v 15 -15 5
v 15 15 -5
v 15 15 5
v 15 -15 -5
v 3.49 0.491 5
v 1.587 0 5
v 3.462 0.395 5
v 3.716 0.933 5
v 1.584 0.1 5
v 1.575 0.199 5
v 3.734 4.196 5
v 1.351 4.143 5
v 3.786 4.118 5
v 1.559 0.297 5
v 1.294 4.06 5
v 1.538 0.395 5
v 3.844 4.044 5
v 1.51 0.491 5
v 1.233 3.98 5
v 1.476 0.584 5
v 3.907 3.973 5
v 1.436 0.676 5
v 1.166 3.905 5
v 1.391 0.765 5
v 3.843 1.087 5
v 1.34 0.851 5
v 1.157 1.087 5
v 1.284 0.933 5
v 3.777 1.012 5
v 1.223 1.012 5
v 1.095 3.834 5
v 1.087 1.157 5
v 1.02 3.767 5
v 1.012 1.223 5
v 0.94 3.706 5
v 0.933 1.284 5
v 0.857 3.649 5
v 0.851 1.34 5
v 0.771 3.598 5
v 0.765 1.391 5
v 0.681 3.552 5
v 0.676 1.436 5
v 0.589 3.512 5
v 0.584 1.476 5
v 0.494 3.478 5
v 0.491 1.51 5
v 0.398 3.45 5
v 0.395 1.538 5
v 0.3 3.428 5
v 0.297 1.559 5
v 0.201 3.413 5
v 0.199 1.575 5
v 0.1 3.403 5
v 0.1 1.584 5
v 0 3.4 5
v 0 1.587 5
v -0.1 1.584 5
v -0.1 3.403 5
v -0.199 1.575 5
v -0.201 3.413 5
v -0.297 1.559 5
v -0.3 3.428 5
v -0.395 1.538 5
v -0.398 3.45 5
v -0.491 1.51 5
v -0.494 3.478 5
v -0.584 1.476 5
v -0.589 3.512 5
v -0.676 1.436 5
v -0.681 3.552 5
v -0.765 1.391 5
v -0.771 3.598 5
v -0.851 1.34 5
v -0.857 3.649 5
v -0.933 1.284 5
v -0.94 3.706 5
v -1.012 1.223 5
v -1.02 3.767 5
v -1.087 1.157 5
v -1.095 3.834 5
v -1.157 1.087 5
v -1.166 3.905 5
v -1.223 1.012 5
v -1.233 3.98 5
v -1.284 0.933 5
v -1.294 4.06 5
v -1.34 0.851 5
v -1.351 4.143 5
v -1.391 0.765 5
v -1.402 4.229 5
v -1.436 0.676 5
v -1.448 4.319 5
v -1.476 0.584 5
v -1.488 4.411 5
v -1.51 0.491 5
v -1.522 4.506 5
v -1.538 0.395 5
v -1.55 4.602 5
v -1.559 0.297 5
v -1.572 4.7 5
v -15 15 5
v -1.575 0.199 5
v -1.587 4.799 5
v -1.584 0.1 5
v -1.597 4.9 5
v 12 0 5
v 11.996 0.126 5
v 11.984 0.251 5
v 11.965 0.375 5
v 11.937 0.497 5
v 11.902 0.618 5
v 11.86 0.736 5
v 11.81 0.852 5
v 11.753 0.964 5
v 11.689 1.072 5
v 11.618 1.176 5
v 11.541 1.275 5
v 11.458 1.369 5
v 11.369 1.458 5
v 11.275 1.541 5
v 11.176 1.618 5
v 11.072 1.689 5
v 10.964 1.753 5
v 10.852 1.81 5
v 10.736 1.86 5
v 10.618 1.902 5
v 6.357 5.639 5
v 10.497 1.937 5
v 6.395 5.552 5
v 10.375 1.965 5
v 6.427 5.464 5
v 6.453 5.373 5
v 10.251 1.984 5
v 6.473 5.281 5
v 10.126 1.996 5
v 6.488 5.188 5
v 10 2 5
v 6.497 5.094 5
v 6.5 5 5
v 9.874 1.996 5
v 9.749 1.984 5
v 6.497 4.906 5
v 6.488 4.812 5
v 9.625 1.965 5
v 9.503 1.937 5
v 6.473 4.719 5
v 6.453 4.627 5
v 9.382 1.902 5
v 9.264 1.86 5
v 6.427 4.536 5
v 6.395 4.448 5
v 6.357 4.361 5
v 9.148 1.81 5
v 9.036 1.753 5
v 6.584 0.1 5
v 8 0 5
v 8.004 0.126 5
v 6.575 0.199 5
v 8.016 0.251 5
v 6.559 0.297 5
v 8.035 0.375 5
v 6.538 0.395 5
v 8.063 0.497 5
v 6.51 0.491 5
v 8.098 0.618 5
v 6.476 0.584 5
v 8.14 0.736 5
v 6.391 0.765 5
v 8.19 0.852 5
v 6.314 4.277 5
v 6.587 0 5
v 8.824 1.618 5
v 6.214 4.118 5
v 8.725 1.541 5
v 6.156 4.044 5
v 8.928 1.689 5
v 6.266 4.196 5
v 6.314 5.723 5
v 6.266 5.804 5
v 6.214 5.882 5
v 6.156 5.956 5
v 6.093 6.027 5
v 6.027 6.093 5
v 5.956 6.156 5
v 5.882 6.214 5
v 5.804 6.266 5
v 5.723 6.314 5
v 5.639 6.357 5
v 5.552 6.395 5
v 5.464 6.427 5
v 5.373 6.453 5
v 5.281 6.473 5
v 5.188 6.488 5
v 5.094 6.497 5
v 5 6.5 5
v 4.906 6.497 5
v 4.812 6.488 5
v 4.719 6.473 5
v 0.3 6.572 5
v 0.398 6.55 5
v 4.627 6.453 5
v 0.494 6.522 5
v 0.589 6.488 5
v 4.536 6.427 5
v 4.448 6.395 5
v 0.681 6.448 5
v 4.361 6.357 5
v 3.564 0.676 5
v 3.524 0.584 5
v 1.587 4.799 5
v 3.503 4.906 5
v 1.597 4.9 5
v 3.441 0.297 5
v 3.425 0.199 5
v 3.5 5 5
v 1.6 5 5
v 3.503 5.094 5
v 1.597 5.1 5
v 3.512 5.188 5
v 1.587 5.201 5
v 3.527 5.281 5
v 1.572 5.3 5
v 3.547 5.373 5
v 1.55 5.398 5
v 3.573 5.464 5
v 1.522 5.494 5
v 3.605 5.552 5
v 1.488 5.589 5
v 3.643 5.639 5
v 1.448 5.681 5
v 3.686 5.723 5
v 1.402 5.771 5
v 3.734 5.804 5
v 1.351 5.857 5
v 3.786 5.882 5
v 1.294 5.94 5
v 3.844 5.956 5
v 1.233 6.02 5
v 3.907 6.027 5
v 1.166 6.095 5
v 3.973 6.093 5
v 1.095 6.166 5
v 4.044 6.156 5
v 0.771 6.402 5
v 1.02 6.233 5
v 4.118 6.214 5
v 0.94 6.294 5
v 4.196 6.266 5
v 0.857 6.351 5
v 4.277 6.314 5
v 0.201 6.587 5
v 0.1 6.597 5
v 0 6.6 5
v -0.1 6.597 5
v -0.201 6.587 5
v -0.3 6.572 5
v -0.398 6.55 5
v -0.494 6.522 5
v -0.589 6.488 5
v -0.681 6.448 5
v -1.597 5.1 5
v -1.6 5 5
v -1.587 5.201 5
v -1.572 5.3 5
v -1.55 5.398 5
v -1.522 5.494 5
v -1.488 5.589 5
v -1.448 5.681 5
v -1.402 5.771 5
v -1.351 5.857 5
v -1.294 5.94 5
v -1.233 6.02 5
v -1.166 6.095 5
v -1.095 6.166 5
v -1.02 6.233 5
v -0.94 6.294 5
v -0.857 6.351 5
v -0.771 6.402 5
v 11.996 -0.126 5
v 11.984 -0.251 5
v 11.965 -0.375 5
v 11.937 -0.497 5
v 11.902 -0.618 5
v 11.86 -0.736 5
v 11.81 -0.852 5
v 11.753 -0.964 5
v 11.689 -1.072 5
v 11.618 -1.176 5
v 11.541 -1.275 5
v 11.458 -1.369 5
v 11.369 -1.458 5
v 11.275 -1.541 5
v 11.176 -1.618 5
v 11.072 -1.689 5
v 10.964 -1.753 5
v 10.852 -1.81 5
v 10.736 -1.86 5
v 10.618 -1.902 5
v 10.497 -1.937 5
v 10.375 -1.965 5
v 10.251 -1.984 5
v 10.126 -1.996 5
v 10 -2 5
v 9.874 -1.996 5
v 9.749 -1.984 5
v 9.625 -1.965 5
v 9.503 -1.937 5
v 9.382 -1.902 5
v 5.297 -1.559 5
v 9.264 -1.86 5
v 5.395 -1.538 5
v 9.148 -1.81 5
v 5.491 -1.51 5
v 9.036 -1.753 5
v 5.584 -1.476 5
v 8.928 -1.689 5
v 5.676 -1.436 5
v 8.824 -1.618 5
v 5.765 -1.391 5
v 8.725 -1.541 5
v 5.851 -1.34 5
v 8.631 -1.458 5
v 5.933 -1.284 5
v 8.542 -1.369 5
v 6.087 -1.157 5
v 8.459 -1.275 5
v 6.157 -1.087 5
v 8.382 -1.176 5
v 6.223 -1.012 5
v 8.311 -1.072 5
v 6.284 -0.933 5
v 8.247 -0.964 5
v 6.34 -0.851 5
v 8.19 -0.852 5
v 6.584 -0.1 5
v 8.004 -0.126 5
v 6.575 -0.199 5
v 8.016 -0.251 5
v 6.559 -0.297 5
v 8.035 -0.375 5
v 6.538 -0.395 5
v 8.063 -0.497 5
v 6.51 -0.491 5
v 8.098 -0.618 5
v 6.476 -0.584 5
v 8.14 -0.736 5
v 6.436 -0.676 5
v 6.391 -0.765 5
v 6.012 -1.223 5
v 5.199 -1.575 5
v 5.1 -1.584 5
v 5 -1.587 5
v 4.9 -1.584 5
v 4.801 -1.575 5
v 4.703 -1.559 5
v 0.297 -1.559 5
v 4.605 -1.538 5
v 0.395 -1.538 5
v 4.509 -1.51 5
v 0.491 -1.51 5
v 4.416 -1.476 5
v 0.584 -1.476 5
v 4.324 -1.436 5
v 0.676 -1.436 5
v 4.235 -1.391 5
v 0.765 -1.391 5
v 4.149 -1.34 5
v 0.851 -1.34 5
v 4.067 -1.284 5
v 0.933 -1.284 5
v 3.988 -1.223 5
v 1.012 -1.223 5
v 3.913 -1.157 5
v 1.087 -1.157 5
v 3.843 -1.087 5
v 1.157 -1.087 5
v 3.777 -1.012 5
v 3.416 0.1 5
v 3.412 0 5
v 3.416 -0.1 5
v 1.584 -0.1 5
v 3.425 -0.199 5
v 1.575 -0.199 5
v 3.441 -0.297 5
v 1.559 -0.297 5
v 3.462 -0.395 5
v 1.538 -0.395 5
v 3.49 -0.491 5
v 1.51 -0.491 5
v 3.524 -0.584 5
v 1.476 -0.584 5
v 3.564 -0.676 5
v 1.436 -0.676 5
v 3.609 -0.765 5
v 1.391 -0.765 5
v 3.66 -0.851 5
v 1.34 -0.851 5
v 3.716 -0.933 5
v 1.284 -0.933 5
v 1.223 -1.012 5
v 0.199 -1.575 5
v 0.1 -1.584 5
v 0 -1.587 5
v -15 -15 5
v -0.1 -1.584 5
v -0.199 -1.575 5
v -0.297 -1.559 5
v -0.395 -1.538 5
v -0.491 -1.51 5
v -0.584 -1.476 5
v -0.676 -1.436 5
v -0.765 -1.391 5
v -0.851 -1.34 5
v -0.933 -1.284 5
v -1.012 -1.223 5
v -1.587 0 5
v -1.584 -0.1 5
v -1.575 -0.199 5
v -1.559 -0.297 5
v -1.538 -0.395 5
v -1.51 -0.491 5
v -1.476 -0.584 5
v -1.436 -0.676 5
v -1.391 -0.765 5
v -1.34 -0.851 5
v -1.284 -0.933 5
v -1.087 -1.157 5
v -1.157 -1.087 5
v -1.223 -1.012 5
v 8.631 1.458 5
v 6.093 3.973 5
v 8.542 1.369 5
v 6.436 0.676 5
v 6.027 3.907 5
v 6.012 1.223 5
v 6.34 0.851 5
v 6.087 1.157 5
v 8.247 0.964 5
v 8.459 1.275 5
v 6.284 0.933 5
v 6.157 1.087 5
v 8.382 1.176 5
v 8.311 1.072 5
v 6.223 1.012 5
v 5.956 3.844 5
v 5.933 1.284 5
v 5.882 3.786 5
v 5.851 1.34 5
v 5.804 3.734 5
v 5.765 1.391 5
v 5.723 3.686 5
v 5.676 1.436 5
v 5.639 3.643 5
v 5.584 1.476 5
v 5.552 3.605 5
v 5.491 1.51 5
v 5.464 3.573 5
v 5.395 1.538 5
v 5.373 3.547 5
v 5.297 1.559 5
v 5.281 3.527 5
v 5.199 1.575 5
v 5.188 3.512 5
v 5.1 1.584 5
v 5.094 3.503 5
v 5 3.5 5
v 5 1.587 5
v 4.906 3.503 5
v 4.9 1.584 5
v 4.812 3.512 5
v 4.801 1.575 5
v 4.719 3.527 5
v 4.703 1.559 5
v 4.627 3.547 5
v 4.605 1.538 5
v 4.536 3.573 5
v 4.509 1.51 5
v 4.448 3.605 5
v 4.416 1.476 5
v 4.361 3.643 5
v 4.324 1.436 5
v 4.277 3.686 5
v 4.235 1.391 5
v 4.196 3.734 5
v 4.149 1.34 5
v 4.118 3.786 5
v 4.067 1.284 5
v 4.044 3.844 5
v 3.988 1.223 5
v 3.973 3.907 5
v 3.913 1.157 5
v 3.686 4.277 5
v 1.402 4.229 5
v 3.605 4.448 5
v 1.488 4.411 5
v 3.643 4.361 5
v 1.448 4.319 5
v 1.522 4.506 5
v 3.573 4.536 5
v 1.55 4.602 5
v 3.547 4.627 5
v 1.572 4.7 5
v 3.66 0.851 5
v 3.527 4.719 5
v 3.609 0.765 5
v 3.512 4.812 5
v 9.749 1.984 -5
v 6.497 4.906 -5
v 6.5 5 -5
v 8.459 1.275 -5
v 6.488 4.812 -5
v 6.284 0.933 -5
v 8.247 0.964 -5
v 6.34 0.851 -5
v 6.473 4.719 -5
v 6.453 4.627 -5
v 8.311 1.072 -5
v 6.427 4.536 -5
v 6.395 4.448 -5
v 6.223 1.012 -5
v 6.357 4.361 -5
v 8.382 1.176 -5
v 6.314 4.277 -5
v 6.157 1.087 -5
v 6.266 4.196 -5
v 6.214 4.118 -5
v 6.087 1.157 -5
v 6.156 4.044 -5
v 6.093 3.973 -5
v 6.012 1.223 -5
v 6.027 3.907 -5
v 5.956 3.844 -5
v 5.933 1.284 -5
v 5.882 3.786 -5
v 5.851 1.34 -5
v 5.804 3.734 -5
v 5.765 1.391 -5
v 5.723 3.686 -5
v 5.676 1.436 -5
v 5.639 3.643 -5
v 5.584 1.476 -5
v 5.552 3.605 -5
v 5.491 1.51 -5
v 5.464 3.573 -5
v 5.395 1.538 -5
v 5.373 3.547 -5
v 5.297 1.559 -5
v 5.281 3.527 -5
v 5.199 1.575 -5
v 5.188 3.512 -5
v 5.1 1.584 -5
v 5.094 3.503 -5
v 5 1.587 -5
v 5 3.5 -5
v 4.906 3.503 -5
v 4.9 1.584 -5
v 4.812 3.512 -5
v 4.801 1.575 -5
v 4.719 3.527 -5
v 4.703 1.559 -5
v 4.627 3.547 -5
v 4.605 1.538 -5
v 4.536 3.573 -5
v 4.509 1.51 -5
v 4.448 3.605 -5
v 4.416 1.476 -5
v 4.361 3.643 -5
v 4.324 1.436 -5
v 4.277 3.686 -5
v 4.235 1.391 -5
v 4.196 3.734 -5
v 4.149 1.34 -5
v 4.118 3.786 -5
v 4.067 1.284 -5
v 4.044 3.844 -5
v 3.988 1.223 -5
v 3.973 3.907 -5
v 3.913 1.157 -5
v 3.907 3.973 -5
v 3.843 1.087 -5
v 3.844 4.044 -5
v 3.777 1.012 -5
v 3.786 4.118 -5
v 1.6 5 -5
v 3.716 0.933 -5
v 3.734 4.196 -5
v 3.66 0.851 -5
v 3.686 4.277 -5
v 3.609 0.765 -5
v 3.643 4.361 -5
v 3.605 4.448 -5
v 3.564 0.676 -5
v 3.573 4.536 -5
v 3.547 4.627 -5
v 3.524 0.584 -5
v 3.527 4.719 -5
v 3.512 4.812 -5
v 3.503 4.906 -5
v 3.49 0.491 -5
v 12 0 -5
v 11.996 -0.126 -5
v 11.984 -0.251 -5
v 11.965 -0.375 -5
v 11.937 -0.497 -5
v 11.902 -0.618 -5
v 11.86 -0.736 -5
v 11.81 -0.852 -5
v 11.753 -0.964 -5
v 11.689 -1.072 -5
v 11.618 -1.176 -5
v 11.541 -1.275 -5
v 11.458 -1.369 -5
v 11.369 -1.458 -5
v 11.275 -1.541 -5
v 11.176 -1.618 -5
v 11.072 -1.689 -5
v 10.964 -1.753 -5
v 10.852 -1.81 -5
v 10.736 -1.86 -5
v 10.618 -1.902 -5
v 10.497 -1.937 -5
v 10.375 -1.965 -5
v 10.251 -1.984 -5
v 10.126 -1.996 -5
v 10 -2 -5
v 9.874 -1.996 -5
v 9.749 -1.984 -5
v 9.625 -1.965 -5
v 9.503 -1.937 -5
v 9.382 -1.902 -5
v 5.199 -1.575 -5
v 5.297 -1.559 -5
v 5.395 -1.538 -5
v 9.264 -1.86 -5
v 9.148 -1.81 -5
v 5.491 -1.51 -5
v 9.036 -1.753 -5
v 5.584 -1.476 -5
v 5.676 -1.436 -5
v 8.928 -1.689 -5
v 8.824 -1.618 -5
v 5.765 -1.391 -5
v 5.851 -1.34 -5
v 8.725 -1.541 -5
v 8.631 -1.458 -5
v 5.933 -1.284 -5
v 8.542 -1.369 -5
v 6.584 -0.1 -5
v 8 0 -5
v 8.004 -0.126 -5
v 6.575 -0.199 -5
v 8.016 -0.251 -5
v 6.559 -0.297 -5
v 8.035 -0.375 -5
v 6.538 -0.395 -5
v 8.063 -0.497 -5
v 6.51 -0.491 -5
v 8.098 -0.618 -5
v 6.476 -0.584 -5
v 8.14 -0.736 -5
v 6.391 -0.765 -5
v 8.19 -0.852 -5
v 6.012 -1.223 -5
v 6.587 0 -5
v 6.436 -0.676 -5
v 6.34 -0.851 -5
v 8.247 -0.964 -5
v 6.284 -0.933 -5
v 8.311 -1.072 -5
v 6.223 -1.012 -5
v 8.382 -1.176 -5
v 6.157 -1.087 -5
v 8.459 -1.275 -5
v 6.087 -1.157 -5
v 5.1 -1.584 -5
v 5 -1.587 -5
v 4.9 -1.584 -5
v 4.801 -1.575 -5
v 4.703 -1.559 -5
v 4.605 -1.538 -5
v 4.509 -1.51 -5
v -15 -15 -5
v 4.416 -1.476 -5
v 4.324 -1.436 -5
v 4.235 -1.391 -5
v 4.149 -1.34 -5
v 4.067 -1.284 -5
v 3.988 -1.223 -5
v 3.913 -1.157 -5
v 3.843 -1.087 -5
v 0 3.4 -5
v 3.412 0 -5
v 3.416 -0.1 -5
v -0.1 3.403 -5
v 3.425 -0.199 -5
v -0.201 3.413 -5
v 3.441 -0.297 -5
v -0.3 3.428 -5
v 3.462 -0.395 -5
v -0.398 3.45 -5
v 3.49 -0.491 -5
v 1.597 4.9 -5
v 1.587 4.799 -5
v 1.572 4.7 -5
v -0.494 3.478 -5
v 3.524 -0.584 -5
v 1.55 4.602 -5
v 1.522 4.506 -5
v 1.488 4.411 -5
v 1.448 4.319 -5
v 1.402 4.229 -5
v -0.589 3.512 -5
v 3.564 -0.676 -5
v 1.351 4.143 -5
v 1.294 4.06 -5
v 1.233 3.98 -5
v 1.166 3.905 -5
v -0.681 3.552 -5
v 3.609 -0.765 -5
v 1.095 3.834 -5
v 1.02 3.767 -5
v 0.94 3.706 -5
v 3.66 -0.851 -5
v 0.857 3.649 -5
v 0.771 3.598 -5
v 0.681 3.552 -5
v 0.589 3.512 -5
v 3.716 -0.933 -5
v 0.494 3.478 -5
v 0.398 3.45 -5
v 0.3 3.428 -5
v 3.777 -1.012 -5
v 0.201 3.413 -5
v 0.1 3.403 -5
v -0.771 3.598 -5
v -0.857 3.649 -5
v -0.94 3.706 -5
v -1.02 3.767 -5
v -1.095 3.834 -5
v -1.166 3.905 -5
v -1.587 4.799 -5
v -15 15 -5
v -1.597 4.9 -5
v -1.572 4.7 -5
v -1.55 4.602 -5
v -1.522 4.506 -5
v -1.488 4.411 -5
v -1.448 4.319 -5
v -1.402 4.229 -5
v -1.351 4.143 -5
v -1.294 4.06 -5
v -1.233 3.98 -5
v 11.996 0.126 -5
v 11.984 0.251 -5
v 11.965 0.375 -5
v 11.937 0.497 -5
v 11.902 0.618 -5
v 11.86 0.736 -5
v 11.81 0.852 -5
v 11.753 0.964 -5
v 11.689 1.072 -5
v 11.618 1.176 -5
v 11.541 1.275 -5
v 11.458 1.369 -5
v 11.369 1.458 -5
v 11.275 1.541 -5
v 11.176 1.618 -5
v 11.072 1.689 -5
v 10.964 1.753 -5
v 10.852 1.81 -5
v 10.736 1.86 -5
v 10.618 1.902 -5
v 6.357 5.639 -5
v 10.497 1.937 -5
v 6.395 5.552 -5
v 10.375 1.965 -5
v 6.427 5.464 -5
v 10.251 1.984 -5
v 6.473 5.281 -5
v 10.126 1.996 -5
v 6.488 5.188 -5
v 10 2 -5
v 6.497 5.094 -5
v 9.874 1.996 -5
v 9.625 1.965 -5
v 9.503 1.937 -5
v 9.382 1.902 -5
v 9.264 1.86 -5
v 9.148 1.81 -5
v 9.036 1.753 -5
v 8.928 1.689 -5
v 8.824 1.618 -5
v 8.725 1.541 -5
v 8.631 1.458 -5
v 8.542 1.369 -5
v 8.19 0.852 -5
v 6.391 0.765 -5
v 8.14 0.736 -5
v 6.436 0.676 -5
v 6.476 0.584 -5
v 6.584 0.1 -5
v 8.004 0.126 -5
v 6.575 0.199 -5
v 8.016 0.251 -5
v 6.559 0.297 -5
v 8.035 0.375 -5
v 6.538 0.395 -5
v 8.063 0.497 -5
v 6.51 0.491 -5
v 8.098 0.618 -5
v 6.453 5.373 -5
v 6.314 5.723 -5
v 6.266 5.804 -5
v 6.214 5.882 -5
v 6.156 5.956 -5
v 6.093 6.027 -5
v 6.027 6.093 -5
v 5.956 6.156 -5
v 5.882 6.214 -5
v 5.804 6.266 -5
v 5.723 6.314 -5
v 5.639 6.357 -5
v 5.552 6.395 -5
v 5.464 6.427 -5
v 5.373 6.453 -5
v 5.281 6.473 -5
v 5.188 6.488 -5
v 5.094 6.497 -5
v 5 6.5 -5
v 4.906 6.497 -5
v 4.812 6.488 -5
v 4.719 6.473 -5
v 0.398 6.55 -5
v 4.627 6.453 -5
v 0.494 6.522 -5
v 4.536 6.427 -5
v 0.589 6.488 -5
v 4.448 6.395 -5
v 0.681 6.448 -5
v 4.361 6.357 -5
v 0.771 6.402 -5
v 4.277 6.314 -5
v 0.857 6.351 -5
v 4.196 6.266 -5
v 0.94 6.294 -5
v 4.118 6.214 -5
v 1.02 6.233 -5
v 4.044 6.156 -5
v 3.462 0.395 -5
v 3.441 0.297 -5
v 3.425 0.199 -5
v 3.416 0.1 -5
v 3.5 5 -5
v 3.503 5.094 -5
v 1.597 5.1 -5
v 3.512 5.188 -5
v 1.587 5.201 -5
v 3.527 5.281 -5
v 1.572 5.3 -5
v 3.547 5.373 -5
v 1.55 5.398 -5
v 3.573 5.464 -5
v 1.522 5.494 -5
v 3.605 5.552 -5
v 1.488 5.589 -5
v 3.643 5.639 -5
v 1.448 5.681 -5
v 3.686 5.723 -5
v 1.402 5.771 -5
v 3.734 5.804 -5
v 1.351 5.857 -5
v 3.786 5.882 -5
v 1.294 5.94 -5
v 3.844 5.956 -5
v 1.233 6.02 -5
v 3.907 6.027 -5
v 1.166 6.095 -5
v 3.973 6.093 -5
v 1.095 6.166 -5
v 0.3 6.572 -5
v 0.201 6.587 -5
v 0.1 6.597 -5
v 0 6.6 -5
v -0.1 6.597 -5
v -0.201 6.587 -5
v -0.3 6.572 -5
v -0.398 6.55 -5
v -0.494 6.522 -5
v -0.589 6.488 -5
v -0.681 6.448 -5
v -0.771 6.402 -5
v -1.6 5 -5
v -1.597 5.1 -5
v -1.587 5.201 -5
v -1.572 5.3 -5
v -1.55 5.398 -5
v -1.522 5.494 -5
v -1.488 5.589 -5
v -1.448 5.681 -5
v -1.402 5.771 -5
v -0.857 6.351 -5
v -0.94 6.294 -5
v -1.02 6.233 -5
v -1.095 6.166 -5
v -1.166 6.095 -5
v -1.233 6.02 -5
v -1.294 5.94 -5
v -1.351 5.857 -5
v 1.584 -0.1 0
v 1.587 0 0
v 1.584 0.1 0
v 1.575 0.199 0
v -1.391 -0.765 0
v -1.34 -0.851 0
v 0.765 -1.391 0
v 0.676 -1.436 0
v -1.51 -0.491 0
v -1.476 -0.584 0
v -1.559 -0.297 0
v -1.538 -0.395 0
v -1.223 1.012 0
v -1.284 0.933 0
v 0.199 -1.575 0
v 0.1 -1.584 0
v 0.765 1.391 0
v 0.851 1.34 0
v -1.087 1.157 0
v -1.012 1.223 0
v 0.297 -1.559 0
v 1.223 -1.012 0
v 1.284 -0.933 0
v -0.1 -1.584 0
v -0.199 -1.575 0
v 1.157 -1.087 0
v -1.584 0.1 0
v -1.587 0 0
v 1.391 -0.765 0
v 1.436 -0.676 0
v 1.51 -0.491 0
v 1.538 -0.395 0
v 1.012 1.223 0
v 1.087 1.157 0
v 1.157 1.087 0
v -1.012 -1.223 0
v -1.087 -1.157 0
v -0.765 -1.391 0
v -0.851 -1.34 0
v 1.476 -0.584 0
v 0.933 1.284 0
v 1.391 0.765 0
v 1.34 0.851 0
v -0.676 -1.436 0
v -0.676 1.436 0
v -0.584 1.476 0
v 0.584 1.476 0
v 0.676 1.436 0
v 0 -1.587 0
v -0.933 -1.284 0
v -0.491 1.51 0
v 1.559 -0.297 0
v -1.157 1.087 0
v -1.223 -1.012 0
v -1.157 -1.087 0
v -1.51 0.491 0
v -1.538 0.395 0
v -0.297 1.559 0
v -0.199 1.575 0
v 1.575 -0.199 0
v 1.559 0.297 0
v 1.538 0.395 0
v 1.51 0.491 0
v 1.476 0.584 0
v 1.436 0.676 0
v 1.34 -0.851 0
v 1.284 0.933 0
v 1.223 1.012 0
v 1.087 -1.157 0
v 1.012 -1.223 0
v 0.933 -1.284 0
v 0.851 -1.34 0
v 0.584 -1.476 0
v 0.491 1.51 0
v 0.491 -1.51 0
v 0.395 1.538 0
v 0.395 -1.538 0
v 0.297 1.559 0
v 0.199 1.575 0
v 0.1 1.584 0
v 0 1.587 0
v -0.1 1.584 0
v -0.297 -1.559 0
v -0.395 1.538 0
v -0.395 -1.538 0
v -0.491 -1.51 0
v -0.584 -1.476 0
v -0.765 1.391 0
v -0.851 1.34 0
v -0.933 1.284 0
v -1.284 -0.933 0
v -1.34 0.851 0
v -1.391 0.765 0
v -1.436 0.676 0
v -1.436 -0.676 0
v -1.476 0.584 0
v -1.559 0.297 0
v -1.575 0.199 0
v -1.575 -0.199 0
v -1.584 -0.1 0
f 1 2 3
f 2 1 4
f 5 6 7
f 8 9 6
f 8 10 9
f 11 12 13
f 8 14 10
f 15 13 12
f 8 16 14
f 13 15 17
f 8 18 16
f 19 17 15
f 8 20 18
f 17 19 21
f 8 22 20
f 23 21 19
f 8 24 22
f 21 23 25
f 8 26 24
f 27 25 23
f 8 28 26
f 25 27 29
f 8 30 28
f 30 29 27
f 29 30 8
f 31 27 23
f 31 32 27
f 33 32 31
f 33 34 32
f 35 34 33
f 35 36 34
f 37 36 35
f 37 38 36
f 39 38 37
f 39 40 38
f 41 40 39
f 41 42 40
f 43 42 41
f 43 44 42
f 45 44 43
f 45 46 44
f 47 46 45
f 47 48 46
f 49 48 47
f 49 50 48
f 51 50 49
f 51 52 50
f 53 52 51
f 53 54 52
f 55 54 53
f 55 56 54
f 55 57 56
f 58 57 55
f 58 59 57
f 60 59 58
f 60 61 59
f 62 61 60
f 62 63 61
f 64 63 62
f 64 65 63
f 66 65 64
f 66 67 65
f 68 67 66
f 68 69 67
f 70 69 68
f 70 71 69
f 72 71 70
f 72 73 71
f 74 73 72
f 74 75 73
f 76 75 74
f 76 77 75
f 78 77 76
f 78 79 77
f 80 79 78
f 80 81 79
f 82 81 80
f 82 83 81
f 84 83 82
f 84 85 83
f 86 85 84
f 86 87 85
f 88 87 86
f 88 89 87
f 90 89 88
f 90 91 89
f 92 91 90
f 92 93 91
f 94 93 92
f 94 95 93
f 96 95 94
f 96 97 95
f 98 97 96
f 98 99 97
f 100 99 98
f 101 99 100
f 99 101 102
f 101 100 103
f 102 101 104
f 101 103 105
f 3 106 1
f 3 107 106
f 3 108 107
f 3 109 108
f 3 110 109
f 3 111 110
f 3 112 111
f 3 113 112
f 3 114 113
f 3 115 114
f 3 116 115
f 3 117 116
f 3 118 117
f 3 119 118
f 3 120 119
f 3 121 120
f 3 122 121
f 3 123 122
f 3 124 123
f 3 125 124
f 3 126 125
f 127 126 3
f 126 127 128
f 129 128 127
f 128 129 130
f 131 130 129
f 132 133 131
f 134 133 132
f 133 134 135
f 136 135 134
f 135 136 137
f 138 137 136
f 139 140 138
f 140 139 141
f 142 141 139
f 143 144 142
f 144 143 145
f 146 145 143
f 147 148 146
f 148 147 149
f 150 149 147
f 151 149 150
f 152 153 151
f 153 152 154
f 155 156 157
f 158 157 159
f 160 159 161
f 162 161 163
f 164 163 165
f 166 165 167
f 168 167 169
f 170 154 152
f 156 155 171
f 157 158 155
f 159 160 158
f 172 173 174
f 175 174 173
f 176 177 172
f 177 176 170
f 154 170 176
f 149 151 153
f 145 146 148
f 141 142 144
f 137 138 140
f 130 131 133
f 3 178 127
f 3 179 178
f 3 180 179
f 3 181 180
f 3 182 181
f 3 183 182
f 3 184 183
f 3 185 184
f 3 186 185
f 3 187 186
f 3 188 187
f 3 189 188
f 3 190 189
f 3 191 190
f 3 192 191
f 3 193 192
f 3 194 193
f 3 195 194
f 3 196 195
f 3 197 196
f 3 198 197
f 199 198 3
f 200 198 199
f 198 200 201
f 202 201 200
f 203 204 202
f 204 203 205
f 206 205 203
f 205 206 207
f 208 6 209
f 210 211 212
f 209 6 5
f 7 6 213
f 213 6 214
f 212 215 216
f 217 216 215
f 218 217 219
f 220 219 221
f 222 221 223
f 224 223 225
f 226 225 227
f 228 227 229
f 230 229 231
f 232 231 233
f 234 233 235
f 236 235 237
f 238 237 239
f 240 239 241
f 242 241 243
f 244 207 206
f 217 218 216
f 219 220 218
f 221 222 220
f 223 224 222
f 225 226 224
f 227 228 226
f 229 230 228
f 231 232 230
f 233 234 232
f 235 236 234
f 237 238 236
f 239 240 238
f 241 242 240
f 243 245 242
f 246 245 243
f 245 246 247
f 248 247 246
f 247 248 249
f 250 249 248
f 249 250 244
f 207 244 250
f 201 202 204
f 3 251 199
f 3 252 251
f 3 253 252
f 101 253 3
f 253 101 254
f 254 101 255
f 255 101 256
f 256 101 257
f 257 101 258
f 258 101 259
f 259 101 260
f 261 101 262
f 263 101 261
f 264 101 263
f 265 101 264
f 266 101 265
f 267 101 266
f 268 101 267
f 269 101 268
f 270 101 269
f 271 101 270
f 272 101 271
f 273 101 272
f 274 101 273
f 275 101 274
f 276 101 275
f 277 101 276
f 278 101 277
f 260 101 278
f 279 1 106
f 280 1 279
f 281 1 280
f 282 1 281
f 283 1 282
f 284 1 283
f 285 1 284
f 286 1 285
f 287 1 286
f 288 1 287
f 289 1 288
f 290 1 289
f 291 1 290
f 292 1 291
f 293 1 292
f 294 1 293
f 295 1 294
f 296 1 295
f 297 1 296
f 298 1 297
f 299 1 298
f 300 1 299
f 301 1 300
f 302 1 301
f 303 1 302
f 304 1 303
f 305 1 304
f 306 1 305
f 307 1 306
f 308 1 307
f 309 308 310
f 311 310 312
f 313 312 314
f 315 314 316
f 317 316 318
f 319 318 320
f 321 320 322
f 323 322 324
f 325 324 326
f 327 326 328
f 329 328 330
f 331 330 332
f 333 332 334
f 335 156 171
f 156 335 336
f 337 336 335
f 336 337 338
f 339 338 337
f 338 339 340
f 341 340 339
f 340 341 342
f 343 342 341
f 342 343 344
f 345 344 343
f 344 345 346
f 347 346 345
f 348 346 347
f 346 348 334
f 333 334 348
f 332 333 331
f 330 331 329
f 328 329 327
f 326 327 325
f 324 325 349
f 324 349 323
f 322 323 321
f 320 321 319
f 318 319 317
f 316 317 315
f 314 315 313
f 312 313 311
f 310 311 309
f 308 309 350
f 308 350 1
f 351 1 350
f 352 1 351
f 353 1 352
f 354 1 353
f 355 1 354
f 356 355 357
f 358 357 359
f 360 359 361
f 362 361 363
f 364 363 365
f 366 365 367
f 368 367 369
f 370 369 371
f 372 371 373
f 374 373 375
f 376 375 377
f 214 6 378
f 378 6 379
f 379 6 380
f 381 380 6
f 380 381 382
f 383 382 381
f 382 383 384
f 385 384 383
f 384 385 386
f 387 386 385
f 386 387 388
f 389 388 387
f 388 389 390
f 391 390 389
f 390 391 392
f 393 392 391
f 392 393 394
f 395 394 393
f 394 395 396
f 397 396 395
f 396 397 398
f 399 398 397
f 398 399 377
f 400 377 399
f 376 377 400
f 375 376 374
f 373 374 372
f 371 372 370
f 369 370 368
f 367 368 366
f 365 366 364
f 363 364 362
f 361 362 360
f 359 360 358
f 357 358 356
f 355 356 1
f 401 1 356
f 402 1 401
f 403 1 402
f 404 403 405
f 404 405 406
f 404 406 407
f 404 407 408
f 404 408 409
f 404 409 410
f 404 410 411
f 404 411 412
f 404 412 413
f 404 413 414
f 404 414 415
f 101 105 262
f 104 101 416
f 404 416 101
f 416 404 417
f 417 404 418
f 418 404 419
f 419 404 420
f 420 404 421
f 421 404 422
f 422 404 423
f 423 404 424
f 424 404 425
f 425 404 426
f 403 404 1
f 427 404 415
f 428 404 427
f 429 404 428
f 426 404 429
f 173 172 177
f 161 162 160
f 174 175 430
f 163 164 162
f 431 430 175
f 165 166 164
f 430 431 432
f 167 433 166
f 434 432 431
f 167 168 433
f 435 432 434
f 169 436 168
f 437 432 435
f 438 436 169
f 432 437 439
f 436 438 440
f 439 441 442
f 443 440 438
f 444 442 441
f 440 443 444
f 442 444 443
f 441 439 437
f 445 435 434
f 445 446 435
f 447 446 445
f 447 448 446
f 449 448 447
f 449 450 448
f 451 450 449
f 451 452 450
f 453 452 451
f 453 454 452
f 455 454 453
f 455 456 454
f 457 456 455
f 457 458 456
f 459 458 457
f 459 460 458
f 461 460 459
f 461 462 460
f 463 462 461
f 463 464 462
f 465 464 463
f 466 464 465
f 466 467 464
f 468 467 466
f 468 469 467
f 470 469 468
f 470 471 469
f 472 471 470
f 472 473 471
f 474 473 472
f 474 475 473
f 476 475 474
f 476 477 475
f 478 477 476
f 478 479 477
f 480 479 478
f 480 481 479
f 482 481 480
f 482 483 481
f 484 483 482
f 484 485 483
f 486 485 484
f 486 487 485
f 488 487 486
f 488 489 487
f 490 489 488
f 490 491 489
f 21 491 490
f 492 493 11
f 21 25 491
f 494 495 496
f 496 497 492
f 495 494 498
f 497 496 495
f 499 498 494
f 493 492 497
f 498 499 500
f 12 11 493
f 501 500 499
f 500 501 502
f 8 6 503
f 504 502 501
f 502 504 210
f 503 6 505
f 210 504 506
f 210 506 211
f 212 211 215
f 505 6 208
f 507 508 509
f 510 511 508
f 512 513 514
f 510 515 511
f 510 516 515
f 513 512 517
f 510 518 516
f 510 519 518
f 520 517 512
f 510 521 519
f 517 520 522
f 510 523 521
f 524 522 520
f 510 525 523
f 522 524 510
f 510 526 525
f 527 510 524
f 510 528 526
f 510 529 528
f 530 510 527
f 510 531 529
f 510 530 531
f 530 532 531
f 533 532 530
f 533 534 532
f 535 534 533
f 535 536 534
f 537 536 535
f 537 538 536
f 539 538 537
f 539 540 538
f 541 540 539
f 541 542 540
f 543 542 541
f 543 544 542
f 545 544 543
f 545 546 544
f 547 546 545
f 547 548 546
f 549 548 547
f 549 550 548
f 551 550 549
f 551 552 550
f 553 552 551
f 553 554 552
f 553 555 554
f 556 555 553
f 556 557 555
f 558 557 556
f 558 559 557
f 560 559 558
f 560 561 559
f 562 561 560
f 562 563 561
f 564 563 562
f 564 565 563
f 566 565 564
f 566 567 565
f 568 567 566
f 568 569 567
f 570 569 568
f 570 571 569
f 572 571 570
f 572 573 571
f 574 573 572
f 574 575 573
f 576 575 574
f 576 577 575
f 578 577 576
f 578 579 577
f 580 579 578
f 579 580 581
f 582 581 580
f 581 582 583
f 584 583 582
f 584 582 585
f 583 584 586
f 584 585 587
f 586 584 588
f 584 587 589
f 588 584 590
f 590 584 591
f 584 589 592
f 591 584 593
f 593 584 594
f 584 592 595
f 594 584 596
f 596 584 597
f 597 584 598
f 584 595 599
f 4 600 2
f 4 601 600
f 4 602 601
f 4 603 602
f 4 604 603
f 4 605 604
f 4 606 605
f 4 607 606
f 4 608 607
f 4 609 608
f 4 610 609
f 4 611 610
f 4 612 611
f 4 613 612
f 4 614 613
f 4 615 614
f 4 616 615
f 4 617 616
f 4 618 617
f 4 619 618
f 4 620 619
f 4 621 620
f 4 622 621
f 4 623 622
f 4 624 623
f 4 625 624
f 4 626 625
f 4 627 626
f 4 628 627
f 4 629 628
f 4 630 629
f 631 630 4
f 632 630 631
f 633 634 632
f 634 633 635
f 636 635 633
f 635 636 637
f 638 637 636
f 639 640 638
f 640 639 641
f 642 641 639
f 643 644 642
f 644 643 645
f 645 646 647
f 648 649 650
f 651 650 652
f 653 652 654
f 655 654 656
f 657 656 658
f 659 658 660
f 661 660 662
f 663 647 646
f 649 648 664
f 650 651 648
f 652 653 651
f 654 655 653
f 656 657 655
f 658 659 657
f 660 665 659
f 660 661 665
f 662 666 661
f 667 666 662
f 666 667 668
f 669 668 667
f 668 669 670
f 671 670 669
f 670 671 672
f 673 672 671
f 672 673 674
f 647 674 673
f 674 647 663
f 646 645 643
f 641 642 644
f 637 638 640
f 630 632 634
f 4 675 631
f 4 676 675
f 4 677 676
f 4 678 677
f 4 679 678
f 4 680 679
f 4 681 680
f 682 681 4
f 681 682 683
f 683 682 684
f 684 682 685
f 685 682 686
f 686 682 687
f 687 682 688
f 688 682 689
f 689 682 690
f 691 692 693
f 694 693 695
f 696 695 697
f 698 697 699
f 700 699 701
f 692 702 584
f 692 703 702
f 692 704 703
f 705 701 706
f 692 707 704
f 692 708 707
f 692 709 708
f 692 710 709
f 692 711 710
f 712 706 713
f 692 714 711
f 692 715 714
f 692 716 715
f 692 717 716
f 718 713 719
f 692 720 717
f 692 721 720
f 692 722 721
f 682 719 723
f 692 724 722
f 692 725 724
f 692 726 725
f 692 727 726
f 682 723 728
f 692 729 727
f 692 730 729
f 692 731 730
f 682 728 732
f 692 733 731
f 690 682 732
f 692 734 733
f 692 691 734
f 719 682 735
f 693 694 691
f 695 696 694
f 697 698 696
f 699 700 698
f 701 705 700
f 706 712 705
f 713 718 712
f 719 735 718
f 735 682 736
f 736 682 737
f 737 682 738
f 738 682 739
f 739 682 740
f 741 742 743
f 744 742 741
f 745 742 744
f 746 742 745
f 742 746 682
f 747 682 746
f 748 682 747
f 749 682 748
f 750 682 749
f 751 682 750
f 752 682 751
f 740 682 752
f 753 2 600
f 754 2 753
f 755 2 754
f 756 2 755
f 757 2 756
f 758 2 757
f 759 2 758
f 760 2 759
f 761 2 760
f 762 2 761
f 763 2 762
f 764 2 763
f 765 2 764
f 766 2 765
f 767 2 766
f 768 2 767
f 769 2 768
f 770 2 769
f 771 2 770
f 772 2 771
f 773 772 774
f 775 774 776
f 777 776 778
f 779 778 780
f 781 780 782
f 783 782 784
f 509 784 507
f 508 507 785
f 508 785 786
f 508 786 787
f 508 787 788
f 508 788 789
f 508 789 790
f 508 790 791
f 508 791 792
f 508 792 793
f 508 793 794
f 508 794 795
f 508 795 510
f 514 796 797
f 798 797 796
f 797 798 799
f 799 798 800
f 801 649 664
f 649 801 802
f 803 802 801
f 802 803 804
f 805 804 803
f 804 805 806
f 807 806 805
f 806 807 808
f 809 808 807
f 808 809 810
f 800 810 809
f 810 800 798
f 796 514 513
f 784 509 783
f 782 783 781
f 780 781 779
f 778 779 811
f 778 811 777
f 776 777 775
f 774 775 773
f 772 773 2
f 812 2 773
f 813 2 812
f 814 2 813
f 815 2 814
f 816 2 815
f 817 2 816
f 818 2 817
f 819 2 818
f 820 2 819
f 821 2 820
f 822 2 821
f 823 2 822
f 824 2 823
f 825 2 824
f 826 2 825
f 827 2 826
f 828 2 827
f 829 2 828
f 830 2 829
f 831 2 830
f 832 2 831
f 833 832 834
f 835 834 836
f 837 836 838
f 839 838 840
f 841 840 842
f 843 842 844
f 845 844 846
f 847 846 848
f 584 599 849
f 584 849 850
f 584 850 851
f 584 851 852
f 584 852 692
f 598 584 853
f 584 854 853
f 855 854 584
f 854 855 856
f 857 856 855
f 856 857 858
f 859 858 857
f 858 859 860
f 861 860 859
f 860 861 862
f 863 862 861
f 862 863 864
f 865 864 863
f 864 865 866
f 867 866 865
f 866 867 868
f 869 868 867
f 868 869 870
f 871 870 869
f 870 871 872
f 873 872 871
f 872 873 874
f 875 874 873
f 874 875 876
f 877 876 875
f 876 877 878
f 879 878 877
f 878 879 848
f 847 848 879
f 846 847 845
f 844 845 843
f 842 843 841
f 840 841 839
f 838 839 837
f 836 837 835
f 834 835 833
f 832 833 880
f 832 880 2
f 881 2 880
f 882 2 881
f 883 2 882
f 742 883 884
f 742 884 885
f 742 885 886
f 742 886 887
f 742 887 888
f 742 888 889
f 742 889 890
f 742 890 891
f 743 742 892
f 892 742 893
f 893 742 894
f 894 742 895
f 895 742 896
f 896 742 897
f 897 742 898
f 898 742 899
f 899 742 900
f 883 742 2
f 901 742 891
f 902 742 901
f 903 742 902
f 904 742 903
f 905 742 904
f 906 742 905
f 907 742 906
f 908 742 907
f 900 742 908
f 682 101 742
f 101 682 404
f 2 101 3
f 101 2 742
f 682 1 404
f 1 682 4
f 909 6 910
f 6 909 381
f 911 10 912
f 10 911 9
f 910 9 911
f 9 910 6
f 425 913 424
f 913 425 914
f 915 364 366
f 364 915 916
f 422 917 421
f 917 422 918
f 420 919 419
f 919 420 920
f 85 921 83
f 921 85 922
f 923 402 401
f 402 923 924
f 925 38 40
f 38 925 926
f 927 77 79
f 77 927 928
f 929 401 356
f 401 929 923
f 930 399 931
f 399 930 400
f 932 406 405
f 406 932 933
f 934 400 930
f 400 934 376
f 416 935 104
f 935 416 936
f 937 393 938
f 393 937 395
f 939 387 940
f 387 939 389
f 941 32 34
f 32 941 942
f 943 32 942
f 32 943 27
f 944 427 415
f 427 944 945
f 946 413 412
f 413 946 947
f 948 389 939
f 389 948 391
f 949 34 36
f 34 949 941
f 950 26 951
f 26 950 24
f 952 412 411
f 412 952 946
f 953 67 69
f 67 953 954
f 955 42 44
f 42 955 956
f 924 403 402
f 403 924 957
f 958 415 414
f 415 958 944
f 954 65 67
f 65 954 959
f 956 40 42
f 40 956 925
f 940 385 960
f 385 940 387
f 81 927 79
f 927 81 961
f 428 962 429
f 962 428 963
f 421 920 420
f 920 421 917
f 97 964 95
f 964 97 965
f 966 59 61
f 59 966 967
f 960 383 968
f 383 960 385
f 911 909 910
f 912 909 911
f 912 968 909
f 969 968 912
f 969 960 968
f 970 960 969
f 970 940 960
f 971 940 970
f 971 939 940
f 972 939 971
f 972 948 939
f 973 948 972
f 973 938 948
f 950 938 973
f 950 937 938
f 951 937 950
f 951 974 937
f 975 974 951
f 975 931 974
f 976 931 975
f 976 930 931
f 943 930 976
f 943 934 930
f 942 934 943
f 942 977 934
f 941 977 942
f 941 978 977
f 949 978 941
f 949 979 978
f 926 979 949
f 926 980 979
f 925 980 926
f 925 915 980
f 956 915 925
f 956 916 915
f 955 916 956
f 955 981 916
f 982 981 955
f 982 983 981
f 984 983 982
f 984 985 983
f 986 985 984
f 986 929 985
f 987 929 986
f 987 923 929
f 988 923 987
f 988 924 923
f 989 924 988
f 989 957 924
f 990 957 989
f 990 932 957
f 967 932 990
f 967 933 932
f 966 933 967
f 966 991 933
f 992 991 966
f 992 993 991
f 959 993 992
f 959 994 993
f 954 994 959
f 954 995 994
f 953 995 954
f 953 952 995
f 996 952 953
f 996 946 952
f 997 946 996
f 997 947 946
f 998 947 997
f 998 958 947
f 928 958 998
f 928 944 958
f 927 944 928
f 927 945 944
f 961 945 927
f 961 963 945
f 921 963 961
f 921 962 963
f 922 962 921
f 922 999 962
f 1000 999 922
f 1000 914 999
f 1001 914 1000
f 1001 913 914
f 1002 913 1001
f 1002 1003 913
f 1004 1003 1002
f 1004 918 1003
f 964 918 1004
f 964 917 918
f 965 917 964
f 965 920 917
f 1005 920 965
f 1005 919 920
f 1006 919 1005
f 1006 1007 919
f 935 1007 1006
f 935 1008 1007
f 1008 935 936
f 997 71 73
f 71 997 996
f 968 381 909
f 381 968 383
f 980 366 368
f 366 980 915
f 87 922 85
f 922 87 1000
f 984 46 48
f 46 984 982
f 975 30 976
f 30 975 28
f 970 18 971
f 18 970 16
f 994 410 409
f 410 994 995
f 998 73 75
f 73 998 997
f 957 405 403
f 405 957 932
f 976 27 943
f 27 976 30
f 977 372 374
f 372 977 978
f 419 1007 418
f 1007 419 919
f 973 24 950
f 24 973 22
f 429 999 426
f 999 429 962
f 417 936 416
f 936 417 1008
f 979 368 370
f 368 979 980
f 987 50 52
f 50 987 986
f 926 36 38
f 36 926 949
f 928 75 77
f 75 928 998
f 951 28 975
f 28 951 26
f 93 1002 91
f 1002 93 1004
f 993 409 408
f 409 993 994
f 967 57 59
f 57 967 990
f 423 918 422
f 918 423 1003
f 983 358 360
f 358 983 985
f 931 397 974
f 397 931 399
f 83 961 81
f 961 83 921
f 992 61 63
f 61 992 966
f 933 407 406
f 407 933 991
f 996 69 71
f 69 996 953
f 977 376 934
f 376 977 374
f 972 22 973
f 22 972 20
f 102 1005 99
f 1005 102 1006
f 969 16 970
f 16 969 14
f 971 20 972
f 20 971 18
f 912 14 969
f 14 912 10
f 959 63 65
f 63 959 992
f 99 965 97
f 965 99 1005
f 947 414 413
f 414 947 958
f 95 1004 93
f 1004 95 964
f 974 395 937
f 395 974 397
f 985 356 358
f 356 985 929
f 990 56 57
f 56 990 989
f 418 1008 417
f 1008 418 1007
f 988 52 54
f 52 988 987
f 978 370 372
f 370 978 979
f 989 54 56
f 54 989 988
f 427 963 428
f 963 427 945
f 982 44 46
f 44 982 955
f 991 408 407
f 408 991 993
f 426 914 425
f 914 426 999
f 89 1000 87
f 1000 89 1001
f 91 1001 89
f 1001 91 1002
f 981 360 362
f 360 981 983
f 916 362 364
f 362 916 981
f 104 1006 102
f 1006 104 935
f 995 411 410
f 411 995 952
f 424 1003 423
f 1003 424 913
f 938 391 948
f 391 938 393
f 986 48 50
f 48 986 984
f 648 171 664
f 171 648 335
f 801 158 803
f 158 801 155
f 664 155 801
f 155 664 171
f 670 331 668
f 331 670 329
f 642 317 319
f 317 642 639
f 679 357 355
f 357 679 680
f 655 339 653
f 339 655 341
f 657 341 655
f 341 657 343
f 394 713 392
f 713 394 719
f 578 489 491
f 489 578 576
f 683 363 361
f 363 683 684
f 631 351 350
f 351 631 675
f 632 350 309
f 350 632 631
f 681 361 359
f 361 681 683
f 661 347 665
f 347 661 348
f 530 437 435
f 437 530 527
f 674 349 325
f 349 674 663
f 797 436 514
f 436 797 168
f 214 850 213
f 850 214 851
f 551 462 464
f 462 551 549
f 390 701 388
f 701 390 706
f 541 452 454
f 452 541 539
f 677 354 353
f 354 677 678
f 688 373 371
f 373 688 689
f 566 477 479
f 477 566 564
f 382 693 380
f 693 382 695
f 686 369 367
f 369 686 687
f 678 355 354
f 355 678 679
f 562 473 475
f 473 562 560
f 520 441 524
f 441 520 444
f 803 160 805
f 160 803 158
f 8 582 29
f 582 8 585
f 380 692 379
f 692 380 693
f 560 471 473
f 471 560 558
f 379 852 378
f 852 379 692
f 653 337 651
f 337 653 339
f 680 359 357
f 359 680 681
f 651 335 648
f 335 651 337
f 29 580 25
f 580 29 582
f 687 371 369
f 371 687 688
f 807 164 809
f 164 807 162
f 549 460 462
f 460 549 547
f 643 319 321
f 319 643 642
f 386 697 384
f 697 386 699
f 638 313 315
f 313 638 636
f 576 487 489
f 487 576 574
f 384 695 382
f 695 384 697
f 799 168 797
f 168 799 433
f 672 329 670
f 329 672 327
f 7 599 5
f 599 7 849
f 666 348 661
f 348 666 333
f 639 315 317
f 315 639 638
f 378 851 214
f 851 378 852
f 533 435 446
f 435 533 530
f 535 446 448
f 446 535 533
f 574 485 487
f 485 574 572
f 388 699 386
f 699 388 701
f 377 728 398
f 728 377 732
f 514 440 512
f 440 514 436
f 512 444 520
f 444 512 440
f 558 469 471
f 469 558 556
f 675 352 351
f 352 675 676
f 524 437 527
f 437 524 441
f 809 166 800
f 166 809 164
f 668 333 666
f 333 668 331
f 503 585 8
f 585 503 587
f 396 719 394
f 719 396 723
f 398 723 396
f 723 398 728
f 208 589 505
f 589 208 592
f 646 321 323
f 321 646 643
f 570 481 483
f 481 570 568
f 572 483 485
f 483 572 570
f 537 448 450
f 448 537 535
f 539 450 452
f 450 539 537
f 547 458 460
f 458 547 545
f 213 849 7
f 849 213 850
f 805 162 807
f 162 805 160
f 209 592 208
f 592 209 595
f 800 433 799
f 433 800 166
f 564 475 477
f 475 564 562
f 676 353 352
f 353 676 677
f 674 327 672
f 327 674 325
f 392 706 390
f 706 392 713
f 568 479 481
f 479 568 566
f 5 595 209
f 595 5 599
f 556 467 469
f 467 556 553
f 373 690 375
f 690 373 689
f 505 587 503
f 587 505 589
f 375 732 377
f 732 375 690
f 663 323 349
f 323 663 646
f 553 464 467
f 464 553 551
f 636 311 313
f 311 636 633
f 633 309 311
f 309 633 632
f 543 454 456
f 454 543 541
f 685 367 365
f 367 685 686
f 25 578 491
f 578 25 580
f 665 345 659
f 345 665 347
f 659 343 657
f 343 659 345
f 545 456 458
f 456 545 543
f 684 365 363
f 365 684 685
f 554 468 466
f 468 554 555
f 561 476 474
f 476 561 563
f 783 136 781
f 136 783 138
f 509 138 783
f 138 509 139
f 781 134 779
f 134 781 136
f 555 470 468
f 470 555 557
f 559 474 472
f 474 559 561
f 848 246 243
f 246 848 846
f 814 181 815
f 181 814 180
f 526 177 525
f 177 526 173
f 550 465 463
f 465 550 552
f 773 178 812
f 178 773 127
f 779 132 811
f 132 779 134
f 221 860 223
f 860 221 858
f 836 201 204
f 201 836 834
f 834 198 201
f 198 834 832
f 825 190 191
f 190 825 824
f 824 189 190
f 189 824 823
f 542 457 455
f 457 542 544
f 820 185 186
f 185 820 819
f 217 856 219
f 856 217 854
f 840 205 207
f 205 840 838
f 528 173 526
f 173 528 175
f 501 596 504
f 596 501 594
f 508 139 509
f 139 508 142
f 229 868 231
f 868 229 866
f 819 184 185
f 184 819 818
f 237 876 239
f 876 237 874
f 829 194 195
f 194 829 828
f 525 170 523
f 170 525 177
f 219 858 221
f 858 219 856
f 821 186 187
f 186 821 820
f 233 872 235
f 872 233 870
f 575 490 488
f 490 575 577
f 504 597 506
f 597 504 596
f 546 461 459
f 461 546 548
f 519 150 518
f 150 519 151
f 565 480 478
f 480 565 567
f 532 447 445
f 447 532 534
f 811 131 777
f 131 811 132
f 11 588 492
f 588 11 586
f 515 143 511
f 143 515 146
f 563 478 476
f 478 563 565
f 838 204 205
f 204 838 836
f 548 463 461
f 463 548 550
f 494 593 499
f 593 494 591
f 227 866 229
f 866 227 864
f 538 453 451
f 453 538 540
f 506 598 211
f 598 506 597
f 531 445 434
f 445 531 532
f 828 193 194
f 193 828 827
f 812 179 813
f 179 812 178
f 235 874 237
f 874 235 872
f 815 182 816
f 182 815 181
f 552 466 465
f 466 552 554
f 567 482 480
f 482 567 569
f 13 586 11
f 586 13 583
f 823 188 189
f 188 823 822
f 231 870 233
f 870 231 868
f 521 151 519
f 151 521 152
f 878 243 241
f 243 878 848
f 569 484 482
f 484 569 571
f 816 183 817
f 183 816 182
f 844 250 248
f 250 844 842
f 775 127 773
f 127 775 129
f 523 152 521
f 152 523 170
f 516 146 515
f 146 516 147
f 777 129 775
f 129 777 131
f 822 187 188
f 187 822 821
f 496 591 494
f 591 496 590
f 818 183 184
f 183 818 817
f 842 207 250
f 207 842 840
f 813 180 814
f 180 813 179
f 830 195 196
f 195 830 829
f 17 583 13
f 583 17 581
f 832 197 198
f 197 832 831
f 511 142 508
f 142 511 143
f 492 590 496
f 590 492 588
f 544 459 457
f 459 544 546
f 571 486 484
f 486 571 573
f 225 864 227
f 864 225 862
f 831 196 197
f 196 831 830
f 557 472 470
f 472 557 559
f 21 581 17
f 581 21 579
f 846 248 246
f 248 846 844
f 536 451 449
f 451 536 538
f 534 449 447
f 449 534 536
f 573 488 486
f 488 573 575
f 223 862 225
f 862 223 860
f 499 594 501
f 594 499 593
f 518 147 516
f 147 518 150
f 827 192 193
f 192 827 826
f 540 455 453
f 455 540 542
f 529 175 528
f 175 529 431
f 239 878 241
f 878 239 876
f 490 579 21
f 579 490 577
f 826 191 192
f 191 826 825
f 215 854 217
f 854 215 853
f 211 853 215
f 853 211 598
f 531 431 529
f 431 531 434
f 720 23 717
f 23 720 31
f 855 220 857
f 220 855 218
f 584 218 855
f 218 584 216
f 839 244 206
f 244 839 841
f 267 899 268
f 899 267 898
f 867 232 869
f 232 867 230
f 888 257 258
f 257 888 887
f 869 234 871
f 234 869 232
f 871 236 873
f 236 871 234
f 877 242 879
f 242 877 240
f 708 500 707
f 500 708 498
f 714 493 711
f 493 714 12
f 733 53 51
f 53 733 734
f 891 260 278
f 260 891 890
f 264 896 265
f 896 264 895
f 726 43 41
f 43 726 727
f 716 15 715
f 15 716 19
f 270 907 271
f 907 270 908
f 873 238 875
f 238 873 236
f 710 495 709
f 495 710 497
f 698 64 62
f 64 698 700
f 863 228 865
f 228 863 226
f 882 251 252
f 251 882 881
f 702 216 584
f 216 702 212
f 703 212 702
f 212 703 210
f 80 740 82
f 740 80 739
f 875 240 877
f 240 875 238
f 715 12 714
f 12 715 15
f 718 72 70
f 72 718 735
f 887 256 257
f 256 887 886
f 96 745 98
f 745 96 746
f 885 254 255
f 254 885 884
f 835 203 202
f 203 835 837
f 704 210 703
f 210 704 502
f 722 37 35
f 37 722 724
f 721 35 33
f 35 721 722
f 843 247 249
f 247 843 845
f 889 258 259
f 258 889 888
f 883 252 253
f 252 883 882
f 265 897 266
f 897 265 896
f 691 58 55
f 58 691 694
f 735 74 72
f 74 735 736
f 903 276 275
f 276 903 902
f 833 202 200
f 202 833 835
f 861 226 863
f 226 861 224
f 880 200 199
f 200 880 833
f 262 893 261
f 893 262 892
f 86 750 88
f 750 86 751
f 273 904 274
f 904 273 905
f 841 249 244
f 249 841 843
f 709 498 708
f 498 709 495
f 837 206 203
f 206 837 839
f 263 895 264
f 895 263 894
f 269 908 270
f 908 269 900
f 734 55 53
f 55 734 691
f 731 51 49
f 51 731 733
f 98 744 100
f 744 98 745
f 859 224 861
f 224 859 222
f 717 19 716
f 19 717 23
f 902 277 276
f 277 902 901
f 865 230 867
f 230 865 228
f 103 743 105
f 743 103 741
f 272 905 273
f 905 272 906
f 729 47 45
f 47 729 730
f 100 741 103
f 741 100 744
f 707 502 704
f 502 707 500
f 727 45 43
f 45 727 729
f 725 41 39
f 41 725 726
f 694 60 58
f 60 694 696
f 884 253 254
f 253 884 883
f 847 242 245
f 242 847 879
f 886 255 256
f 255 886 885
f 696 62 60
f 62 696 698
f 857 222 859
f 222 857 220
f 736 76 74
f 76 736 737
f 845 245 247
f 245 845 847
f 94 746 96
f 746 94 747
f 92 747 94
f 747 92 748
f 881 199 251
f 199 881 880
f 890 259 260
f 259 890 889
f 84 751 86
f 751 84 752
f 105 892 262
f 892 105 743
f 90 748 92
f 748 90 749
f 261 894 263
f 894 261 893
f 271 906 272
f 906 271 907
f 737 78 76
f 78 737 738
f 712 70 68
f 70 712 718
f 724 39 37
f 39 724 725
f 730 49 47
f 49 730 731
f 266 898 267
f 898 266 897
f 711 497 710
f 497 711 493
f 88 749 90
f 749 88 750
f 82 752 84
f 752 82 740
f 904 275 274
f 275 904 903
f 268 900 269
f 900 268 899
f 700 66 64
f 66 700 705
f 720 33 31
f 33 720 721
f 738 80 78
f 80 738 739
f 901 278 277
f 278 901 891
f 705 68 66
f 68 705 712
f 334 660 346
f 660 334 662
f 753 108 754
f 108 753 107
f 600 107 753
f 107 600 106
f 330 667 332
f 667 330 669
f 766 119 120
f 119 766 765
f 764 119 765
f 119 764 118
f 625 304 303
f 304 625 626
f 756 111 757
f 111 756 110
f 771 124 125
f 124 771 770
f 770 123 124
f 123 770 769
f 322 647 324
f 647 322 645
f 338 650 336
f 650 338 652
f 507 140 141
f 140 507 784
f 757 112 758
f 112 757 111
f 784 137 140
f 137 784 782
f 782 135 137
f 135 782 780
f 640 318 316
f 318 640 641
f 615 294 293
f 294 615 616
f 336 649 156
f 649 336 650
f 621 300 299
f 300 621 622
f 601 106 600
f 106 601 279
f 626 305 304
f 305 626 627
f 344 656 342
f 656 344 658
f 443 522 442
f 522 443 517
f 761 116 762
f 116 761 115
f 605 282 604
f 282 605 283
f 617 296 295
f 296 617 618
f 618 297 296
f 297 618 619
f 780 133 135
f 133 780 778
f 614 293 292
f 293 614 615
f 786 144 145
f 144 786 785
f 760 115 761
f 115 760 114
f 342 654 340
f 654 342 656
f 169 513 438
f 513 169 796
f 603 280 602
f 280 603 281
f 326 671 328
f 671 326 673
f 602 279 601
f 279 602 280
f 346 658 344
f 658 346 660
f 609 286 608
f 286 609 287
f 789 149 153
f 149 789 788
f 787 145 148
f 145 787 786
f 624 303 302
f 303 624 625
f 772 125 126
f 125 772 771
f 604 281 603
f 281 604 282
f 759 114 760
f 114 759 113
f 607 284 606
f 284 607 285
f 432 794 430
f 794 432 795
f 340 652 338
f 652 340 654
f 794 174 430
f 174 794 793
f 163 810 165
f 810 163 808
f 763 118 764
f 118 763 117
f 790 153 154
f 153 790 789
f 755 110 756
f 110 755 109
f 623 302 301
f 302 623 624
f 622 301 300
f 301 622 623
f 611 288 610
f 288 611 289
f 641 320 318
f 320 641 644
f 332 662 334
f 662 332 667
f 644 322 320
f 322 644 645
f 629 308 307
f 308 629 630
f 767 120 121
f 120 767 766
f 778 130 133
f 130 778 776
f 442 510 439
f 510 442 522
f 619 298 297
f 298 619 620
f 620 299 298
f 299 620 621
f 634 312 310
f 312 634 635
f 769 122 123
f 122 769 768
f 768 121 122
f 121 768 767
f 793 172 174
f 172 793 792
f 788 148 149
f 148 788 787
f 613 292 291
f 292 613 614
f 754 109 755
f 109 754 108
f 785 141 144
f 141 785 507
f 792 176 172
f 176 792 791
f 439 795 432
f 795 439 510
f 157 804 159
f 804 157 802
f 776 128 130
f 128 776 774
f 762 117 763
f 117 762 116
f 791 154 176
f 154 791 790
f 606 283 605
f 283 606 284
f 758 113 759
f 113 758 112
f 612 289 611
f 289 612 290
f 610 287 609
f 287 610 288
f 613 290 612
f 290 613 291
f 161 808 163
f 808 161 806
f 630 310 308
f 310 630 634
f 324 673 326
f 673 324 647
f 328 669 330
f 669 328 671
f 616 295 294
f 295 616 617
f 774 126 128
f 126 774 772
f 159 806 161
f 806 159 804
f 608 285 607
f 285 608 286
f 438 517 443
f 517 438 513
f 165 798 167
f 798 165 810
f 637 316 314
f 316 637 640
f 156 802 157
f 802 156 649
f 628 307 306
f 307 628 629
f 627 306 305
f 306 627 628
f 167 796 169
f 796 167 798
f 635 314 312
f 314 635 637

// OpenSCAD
$fn=100;
difference() {
cube([30,30, 10], true);
    cylinder(20,3.175/2,3.175/2);
    translate([5,0,-10]) cylinder(50,3.175/2,3.175/2);
    translate([5,5,-10]) cylinder(20,3/2,3/2);
    translate([0,5,-10]) cylinder(20,3.2/2,3.2/2);
    translate([10,0,-10]) cylinder(20,4/2,4/2);
    
}
